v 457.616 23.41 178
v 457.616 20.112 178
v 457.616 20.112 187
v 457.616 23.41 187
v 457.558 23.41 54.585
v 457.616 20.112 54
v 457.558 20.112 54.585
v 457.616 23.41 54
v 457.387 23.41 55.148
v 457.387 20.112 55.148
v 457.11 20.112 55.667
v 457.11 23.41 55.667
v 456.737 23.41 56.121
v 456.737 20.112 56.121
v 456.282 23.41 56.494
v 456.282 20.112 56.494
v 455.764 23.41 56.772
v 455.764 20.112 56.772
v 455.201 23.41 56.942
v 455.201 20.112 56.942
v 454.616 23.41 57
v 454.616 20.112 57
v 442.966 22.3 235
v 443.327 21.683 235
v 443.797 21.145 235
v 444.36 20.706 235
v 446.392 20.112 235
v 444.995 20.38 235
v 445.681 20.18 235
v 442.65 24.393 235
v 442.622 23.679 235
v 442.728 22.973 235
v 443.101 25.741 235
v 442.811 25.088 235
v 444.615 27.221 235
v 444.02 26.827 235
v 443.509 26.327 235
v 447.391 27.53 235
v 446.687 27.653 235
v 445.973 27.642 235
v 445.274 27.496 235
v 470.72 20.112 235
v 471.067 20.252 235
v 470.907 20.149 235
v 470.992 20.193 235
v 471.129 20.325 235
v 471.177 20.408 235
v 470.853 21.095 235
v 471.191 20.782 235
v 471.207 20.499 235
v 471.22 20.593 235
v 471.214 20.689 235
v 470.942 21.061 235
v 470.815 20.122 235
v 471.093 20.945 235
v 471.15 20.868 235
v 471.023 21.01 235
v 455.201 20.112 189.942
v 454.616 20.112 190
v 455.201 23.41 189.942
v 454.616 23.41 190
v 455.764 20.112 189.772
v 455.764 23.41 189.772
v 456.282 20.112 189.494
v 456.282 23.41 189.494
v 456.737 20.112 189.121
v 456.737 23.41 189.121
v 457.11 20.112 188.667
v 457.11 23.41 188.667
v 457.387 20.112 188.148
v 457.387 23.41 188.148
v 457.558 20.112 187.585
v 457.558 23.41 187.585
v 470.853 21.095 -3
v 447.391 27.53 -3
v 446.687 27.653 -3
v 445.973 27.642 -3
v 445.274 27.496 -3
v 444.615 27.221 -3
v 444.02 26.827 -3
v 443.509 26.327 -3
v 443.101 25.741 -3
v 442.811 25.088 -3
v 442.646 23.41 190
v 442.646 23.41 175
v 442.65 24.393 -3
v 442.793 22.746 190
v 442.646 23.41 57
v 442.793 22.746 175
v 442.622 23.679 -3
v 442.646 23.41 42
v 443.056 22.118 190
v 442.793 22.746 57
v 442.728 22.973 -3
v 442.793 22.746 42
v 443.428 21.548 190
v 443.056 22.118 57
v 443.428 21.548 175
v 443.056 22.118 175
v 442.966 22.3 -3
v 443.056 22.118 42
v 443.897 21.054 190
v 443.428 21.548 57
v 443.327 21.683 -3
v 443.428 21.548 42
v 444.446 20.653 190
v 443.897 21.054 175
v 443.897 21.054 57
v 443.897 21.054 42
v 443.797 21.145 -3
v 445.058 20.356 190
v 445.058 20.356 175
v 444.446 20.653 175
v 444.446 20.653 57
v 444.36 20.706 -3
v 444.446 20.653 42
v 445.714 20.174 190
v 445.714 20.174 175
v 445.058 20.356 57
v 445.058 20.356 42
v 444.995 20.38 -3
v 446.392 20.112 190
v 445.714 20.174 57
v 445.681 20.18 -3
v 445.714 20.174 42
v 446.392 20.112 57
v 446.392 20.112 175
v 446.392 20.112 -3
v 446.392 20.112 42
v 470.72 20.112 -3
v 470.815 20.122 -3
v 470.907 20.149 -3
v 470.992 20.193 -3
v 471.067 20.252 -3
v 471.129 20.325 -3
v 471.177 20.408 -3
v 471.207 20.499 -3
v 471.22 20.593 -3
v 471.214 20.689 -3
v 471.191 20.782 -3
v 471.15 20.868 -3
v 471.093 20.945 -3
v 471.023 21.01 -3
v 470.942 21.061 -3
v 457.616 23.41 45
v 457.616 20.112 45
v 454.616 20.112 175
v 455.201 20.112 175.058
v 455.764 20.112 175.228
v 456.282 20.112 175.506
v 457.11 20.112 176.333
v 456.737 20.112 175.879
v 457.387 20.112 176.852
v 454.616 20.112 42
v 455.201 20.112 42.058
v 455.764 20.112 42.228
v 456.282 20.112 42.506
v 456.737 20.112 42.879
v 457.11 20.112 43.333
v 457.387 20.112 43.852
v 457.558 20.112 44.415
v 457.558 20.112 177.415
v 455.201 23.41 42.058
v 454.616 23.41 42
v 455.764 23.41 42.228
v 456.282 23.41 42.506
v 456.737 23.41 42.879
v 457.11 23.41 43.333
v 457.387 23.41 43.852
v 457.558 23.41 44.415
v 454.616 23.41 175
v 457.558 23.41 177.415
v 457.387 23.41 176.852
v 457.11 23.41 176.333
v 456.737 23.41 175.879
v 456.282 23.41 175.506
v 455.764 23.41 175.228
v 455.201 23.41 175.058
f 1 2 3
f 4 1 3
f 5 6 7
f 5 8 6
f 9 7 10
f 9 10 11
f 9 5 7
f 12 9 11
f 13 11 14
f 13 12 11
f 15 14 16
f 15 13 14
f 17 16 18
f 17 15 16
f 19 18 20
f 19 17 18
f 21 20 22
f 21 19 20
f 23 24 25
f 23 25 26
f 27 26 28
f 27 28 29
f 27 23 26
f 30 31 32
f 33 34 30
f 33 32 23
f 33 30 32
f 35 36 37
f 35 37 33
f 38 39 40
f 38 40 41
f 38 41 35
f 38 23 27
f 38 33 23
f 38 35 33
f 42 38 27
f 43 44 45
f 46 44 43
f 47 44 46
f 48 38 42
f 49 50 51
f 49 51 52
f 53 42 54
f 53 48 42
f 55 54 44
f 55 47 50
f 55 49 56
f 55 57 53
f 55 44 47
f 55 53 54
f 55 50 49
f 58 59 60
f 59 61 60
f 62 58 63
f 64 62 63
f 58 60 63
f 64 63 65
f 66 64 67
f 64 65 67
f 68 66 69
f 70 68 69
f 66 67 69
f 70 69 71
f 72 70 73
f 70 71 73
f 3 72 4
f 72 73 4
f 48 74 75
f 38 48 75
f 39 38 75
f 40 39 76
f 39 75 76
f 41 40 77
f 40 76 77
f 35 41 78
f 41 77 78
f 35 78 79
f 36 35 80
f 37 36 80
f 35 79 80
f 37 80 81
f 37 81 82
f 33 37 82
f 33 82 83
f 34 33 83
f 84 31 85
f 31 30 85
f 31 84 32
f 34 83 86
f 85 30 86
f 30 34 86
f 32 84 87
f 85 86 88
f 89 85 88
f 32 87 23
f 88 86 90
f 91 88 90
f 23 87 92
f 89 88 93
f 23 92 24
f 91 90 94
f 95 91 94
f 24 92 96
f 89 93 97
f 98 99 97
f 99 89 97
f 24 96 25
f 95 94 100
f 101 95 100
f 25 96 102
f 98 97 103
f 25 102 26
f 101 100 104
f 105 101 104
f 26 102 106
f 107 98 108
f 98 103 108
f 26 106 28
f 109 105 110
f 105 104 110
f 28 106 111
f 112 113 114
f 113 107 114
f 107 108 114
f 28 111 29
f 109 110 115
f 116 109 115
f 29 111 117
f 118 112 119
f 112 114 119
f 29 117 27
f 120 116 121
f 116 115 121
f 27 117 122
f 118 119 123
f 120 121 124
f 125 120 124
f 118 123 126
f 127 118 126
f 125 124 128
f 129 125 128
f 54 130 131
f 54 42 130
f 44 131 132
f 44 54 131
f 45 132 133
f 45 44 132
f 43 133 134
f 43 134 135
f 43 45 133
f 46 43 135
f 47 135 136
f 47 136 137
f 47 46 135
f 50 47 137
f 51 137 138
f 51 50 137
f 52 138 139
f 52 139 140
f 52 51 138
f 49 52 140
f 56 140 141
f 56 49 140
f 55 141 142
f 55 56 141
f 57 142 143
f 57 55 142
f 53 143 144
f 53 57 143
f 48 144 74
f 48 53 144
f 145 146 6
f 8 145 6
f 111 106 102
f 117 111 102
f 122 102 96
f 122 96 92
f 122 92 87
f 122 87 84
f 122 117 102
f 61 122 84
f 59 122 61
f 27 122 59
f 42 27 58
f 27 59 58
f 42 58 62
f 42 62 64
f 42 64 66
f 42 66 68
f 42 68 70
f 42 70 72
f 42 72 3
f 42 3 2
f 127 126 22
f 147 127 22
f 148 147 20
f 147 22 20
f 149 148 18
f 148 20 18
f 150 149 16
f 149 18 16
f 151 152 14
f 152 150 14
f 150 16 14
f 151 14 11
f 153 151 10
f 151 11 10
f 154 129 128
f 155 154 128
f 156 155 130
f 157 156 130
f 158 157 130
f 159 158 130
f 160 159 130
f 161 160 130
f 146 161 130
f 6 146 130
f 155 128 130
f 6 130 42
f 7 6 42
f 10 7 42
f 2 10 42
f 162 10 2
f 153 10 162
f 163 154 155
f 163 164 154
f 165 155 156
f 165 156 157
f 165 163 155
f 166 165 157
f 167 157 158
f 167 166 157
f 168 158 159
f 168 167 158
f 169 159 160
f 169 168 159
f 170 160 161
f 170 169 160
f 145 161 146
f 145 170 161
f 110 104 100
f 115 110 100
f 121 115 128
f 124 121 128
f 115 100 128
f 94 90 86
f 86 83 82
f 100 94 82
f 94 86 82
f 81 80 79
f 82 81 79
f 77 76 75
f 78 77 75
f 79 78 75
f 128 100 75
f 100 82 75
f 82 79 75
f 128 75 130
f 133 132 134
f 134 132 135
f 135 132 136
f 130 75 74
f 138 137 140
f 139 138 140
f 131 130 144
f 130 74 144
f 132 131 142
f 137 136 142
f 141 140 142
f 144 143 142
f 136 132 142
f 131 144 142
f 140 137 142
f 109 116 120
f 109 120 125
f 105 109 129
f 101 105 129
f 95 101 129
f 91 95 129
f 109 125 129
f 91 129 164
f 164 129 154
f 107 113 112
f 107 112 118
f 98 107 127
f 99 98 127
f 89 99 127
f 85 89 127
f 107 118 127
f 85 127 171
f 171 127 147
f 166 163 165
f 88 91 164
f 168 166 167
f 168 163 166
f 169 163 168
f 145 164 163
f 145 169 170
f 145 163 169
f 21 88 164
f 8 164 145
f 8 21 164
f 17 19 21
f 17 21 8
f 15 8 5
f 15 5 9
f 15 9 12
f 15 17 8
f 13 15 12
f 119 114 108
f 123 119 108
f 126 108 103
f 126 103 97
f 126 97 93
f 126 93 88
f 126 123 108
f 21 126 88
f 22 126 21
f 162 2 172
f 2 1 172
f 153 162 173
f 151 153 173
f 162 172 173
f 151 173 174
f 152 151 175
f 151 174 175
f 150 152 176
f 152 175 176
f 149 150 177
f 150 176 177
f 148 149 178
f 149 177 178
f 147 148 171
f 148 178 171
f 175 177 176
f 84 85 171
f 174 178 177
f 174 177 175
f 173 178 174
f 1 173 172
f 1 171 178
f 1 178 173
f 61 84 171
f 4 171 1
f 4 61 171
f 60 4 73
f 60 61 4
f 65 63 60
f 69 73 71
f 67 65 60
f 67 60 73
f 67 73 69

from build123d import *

# Parameters (mm, degrees)
BOSS_EXTRUDE1_DEPTH = 238
SKETCH3_W           = 15
SKETCH3_H           = 15
CUT_EXTRUDE1_DEPTH  = 54
FILLET1_R           = 0.5
FILLET2_R           = 3


with BuildPart() as part:
    # Sketch2 → Boss-Extrude1 (new body)
    with BuildSketch(Plane.XY.offset(-3)):
        with BuildLine():
            Line((446.391965645, 20.11245238), (474.43313548, 20.11245238))
            Line((474.43313548, 20.11245238), (447.390900992, 27.530319971))
            ThreePointArc((447.390900992, 27.530319971), (442.649552271, 24.39262378), (446.391965645, 20.11245238))
        make_face()
    extrude(amount=BOSS_EXTRUDE1_DEPTH)

    # Sketch3 → Cut-Extrude1 (cut)
    with BuildSketch(Plane.XZ.offset(30.589717262)):
        with Locations((450.115770482, 182.5)):
            Rectangle(SKETCH3_W, SKETCH3_H)
        with Locations((450.115770482, 49.5)):
            Rectangle(SKETCH3_W, SKETCH3_H)
    extrude(amount=-CUT_EXTRUDE1_DEPTH, mode=Mode.SUBTRACT)

    # Fillet1
    fillet1_edges = [part.edges().sort_by_distance(p)[0] for p in [
        (474.43313548, 20.11245238, 116),
    ]]
    fillet(fillet1_edges, radius=FILLET1_R)

    # Fillet2
    fillet2_edges = [part.edges().sort_by_distance(p)[0] for p in [
        (457.615770482, 21.761367559, 190),
        (457.615770482, 21.761367559, 175),
        (457.615770482, 21.761367559, 57),
        (457.615770482, 21.761367559, 42),
    ]]
    fillet(fillet2_edges, radius=FILLET2_R)


solid = part.part
